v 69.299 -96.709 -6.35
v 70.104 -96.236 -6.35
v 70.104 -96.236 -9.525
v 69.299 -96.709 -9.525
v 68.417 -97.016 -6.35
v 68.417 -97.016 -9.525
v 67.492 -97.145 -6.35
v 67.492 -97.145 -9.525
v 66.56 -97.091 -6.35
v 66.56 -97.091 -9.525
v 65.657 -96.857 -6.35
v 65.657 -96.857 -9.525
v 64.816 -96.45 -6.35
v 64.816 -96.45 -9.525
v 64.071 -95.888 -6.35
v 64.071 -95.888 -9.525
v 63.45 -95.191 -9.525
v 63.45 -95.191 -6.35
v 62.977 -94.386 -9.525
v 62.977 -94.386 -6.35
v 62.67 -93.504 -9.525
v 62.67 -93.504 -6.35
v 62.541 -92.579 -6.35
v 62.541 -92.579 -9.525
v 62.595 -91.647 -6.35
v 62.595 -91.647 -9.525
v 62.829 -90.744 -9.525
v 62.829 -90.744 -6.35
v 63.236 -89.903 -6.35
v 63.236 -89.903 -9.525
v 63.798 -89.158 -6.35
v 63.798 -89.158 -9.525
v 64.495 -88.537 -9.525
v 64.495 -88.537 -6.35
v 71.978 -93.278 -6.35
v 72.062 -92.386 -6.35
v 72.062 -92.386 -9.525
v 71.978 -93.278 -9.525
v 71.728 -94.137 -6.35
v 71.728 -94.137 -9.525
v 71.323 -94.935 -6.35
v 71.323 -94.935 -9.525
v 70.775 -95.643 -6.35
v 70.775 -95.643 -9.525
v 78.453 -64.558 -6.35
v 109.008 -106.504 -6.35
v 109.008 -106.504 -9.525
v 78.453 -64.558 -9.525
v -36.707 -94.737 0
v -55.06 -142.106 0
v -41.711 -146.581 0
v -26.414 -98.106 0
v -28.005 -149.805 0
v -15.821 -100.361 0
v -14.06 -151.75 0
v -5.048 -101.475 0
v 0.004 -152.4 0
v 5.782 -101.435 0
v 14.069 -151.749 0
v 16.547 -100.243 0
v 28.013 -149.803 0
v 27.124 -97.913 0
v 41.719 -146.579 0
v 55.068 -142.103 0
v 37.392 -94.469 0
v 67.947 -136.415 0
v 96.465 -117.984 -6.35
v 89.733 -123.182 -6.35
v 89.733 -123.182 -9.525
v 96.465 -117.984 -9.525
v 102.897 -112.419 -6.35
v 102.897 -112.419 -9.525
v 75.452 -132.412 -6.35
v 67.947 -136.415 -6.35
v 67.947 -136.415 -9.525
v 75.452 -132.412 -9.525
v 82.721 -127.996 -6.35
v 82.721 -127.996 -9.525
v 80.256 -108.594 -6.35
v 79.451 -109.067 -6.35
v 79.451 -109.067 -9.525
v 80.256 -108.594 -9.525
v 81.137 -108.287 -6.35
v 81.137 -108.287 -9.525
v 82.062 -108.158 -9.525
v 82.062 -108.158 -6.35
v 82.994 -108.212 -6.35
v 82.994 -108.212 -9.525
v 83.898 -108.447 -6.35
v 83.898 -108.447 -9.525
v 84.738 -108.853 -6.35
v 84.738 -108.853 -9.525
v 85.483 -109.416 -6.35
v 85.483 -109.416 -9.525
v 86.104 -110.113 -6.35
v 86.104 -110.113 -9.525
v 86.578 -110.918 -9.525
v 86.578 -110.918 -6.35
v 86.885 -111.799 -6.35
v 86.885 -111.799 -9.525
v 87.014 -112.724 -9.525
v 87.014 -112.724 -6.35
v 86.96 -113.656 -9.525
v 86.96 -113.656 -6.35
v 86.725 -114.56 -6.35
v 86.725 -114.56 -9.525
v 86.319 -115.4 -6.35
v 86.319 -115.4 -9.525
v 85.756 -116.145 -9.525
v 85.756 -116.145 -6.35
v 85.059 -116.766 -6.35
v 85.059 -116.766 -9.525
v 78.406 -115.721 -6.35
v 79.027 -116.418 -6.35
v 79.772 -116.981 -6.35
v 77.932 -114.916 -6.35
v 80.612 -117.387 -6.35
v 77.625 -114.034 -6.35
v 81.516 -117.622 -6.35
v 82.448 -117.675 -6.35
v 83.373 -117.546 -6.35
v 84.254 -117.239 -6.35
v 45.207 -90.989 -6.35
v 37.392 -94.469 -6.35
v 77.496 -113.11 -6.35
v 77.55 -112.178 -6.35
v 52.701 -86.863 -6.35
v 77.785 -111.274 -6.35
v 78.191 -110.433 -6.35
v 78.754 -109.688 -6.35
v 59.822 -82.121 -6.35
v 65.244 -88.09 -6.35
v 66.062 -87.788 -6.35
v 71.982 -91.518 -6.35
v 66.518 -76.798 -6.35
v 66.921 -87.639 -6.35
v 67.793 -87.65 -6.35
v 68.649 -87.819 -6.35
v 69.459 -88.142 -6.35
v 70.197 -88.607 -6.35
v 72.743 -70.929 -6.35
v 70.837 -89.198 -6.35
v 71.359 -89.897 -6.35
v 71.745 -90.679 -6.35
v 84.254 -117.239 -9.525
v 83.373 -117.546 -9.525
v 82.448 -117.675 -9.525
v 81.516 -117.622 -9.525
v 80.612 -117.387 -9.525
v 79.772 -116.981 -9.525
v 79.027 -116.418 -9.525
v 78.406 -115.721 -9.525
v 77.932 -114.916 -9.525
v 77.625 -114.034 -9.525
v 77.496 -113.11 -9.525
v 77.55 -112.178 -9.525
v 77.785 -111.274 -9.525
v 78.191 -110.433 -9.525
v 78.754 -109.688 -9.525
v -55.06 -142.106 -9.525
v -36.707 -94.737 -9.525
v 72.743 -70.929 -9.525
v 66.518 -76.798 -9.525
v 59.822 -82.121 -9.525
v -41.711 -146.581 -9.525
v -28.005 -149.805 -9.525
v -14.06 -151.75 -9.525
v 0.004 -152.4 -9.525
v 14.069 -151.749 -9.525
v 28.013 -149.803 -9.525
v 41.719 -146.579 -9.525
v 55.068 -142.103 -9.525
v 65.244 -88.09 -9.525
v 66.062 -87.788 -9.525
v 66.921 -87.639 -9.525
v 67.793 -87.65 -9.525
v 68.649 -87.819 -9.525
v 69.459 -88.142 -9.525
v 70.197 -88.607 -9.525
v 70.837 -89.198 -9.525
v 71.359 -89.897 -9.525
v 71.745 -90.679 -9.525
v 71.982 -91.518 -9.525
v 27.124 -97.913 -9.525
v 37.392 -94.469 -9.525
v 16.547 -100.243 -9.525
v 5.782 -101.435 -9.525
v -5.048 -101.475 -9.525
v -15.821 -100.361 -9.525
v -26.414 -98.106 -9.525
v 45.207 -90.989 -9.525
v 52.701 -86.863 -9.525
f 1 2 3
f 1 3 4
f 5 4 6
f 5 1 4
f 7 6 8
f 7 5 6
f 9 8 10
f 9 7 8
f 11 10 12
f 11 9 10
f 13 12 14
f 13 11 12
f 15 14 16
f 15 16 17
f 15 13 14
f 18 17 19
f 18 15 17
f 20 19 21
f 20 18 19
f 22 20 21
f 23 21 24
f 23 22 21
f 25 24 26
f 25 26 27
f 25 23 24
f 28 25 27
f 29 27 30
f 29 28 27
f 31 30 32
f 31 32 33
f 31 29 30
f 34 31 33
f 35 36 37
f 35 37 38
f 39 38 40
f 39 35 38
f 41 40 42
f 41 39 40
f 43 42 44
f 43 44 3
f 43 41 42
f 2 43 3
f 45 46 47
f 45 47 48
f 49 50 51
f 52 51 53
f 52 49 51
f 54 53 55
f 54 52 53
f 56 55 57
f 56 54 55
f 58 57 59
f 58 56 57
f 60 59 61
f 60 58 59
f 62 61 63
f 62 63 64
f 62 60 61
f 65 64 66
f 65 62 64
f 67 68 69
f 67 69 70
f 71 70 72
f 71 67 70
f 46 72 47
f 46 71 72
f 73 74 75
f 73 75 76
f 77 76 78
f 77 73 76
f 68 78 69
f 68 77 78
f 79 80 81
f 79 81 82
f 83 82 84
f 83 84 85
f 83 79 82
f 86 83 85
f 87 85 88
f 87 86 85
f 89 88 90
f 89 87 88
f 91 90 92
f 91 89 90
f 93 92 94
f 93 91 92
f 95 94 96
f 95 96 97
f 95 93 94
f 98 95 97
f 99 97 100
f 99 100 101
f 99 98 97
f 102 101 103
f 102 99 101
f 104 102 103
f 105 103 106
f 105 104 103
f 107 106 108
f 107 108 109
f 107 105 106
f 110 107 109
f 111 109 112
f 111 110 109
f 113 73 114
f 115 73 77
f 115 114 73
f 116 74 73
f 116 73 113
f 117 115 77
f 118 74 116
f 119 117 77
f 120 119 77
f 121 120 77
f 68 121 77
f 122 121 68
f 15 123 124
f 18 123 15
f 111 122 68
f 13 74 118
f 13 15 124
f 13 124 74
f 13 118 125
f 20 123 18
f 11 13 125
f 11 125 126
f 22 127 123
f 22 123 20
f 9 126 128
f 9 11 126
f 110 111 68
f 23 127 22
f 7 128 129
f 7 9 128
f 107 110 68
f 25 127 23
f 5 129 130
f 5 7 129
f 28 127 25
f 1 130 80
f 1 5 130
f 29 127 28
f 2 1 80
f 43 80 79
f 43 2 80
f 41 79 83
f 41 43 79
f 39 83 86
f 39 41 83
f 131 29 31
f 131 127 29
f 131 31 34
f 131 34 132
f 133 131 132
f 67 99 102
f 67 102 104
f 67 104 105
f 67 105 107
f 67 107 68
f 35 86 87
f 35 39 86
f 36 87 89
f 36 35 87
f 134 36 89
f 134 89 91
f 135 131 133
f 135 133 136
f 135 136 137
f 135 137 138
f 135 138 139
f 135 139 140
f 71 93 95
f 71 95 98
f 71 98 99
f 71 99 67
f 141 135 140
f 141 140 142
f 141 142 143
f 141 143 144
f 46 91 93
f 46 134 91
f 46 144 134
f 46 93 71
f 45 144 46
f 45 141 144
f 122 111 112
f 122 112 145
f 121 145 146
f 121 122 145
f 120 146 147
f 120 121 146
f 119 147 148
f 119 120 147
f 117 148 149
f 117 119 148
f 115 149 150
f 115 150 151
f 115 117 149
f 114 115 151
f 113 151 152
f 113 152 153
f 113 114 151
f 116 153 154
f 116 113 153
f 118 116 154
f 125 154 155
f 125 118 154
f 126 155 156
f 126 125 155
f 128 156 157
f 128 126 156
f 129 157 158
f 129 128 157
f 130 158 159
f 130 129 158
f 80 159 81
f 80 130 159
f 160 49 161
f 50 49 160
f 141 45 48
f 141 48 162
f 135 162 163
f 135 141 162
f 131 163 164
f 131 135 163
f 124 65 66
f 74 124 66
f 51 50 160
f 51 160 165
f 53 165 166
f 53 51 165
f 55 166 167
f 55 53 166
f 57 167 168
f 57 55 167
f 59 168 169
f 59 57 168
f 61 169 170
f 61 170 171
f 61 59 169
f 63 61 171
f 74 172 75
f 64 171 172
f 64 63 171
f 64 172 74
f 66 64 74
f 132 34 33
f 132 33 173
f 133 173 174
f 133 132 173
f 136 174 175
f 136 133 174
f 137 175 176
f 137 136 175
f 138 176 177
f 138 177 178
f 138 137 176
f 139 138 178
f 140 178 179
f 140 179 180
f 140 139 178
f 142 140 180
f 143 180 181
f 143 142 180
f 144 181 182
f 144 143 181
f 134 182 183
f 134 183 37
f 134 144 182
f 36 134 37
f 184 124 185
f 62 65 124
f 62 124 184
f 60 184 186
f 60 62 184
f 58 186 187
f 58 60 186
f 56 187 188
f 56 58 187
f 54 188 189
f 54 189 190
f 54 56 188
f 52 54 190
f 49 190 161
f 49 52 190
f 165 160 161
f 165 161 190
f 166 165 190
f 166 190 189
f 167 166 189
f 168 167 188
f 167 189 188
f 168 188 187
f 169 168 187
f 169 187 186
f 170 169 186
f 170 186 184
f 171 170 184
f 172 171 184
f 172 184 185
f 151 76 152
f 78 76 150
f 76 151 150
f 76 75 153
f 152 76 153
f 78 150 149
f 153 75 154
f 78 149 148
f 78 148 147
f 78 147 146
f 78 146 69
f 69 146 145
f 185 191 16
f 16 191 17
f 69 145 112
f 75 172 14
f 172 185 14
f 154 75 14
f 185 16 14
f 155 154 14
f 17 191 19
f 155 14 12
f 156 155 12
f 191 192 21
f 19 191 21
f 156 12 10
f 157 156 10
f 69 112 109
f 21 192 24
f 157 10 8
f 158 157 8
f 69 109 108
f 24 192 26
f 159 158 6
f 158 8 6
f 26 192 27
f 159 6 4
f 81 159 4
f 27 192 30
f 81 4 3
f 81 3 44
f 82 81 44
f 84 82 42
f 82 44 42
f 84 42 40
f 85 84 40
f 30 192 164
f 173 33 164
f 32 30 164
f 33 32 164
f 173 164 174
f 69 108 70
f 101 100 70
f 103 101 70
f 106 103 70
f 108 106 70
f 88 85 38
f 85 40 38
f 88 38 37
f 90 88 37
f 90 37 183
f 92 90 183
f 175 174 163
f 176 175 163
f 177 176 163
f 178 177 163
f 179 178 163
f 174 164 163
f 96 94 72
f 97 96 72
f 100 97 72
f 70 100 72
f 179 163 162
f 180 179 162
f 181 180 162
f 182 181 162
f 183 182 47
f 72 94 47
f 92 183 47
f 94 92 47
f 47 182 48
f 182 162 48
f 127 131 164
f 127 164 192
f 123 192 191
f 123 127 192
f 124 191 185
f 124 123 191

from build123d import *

# Parameters (mm, degrees)
F1_DEPTH = 9.525
F2_DEPTH = 6.35


with BuildPart() as f1:
    # F0 (on Top) → F1 (new body)
    with BuildSketch(Plane.XY):
        with BuildLine():
            Line((109.0079811876, -106.5036151378), (78.4525489868, -64.5581718877))
            ThreePointArc((78.4525489868, -64.5581718877), (69.69265157, -73.9289815778), (59.8218109514, -82.1213183923))
            Line((59.8218109514, -82.1213183923), (64.495389932, -88.5370463917))
            ThreePointArc((64.495389932, -88.5370463917), (69.459011135, -88.1417123974), (72.0620373203, -92.3864831914))
            ThreePointArc((72.0620373203, -92.3864831914), (71.5443081143, -94.5459570061), (70.1036847087, -96.235919991))
            Line((70.1036847087, -96.235919991), (79.4508426698, -109.0673759898))
            ThreePointArc((79.4508426698, -109.0673759898), (84.4144638729, -108.6720419955), (87.0174900582, -112.9168127895))
            ThreePointArc((87.0174900582, -112.9168127895), (86.4997608522, -115.0762866042), (85.0591374465, -116.7662495891))
            Line((85.0591374465, -116.7662495891), (89.7327164271, -123.1819775885))
            ThreePointArc((89.7327164271, -123.1819775885), (99.7196478413, -115.2464829589), (109.0079811876, -106.5036151378))
        make_face()
        with BuildLine():
            ThreePointArc((59.8218109514, -82.1213183923), (48.9973735962, -89.0045919078), (37.3918882403, -94.469077977))
            Line((37.3918882403, -94.469077977), (67.9473205258, -136.4145213434))
            ThreePointArc((67.9473205258, -136.4145213434), (79.1171509025, -130.254506383), (89.7327164271, -123.1819775885))
            Line((89.7327164271, -123.1819775885), (85.0591374465, -116.7662495891))
            ThreePointArc((85.0591374465, -116.7662495891), (78.4055532585, -115.7209601778), (79.4508426698, -109.0673759898))
            Line((79.4508426698, -109.0673759898), (70.1036847087, -96.235919991))
            ThreePointArc((70.1036847087, -96.235919991), (63.4501005207, -95.1906305797), (64.495389932, -88.5370463917))
            Line((64.495389932, -88.5370463917), (59.8218109514, -82.1213183923))
        make_face()
        with BuildLine():
            Line((67.9473205258, -136.4145213434), (37.3918882403, -94.469077977))
            ThreePointArc((37.3918882403, -94.469077977), (0.3678617573, -101.5993340418), (-36.7068265087, -94.7373679582))
            Line((-36.7068265087, -94.7373679582), (-55.0602397631, -142.1060519374))
            ThreePointArc((-55.0602397631, -142.1060519374), (7.0439756368, -152.2371255878), (67.9473205258, -136.4145213434))
        make_face()
    extrude(amount=-F1_DEPTH)

    # F0 (on Top) → F2 (cut)
    with BuildSketch(Plane.XY):
        with BuildLine():
            ThreePointArc((59.8218109514, -82.1213183923), (48.9973735962, -89.0045919078), (37.3918882403, -94.469077977))
            Line((37.3918882403, -94.469077977), (67.9473205258, -136.4145213434))
            ThreePointArc((67.9473205258, -136.4145213434), (79.1171509025, -130.254506383), (89.7327164271, -123.1819775885))
            Line((89.7327164271, -123.1819775885), (85.0591374465, -116.7662495891))
            ThreePointArc((85.0591374465, -116.7662495891), (78.4055532585, -115.7209601778), (79.4508426698, -109.0673759898))
            Line((79.4508426698, -109.0673759898), (70.1036847087, -96.235919991))
            ThreePointArc((70.1036847087, -96.235919991), (63.4501005207, -95.1906305797), (64.495389932, -88.5370463917))
            Line((64.495389932, -88.5370463917), (59.8218109514, -82.1213183923))
        make_face()
        with BuildLine():
            Line((109.0079811876, -106.5036151378), (78.4525489868, -64.5581718877))
            ThreePointArc((78.4525489868, -64.5581718877), (69.69265157, -73.9289815778), (59.8218109514, -82.1213183923))
            Line((59.8218109514, -82.1213183923), (64.495389932, -88.5370463917))
            ThreePointArc((64.495389932, -88.5370463917), (69.459011135, -88.1417123974), (72.0620373203, -92.3864831914))
            ThreePointArc((72.0620373203, -92.3864831914), (71.5443081143, -94.5459570061), (70.1036847087, -96.235919991))
            Line((70.1036847087, -96.235919991), (79.4508426698, -109.0673759898))
            ThreePointArc((79.4508426698, -109.0673759898), (84.4144638729, -108.6720419955), (87.0174900582, -112.9168127895))
            ThreePointArc((87.0174900582, -112.9168127895), (86.4997608522, -115.0762866042), (85.0591374465, -116.7662495891))
            Line((85.0591374465, -116.7662495891), (89.7327164271, -123.1819775885))
            ThreePointArc((89.7327164271, -123.1819775885), (99.7196478413, -115.2464829589), (109.0079811876, -106.5036151378))
        make_face()
    extrude(amount=-F2_DEPTH, mode=Mode.SUBTRACT)


solid = f1.part
